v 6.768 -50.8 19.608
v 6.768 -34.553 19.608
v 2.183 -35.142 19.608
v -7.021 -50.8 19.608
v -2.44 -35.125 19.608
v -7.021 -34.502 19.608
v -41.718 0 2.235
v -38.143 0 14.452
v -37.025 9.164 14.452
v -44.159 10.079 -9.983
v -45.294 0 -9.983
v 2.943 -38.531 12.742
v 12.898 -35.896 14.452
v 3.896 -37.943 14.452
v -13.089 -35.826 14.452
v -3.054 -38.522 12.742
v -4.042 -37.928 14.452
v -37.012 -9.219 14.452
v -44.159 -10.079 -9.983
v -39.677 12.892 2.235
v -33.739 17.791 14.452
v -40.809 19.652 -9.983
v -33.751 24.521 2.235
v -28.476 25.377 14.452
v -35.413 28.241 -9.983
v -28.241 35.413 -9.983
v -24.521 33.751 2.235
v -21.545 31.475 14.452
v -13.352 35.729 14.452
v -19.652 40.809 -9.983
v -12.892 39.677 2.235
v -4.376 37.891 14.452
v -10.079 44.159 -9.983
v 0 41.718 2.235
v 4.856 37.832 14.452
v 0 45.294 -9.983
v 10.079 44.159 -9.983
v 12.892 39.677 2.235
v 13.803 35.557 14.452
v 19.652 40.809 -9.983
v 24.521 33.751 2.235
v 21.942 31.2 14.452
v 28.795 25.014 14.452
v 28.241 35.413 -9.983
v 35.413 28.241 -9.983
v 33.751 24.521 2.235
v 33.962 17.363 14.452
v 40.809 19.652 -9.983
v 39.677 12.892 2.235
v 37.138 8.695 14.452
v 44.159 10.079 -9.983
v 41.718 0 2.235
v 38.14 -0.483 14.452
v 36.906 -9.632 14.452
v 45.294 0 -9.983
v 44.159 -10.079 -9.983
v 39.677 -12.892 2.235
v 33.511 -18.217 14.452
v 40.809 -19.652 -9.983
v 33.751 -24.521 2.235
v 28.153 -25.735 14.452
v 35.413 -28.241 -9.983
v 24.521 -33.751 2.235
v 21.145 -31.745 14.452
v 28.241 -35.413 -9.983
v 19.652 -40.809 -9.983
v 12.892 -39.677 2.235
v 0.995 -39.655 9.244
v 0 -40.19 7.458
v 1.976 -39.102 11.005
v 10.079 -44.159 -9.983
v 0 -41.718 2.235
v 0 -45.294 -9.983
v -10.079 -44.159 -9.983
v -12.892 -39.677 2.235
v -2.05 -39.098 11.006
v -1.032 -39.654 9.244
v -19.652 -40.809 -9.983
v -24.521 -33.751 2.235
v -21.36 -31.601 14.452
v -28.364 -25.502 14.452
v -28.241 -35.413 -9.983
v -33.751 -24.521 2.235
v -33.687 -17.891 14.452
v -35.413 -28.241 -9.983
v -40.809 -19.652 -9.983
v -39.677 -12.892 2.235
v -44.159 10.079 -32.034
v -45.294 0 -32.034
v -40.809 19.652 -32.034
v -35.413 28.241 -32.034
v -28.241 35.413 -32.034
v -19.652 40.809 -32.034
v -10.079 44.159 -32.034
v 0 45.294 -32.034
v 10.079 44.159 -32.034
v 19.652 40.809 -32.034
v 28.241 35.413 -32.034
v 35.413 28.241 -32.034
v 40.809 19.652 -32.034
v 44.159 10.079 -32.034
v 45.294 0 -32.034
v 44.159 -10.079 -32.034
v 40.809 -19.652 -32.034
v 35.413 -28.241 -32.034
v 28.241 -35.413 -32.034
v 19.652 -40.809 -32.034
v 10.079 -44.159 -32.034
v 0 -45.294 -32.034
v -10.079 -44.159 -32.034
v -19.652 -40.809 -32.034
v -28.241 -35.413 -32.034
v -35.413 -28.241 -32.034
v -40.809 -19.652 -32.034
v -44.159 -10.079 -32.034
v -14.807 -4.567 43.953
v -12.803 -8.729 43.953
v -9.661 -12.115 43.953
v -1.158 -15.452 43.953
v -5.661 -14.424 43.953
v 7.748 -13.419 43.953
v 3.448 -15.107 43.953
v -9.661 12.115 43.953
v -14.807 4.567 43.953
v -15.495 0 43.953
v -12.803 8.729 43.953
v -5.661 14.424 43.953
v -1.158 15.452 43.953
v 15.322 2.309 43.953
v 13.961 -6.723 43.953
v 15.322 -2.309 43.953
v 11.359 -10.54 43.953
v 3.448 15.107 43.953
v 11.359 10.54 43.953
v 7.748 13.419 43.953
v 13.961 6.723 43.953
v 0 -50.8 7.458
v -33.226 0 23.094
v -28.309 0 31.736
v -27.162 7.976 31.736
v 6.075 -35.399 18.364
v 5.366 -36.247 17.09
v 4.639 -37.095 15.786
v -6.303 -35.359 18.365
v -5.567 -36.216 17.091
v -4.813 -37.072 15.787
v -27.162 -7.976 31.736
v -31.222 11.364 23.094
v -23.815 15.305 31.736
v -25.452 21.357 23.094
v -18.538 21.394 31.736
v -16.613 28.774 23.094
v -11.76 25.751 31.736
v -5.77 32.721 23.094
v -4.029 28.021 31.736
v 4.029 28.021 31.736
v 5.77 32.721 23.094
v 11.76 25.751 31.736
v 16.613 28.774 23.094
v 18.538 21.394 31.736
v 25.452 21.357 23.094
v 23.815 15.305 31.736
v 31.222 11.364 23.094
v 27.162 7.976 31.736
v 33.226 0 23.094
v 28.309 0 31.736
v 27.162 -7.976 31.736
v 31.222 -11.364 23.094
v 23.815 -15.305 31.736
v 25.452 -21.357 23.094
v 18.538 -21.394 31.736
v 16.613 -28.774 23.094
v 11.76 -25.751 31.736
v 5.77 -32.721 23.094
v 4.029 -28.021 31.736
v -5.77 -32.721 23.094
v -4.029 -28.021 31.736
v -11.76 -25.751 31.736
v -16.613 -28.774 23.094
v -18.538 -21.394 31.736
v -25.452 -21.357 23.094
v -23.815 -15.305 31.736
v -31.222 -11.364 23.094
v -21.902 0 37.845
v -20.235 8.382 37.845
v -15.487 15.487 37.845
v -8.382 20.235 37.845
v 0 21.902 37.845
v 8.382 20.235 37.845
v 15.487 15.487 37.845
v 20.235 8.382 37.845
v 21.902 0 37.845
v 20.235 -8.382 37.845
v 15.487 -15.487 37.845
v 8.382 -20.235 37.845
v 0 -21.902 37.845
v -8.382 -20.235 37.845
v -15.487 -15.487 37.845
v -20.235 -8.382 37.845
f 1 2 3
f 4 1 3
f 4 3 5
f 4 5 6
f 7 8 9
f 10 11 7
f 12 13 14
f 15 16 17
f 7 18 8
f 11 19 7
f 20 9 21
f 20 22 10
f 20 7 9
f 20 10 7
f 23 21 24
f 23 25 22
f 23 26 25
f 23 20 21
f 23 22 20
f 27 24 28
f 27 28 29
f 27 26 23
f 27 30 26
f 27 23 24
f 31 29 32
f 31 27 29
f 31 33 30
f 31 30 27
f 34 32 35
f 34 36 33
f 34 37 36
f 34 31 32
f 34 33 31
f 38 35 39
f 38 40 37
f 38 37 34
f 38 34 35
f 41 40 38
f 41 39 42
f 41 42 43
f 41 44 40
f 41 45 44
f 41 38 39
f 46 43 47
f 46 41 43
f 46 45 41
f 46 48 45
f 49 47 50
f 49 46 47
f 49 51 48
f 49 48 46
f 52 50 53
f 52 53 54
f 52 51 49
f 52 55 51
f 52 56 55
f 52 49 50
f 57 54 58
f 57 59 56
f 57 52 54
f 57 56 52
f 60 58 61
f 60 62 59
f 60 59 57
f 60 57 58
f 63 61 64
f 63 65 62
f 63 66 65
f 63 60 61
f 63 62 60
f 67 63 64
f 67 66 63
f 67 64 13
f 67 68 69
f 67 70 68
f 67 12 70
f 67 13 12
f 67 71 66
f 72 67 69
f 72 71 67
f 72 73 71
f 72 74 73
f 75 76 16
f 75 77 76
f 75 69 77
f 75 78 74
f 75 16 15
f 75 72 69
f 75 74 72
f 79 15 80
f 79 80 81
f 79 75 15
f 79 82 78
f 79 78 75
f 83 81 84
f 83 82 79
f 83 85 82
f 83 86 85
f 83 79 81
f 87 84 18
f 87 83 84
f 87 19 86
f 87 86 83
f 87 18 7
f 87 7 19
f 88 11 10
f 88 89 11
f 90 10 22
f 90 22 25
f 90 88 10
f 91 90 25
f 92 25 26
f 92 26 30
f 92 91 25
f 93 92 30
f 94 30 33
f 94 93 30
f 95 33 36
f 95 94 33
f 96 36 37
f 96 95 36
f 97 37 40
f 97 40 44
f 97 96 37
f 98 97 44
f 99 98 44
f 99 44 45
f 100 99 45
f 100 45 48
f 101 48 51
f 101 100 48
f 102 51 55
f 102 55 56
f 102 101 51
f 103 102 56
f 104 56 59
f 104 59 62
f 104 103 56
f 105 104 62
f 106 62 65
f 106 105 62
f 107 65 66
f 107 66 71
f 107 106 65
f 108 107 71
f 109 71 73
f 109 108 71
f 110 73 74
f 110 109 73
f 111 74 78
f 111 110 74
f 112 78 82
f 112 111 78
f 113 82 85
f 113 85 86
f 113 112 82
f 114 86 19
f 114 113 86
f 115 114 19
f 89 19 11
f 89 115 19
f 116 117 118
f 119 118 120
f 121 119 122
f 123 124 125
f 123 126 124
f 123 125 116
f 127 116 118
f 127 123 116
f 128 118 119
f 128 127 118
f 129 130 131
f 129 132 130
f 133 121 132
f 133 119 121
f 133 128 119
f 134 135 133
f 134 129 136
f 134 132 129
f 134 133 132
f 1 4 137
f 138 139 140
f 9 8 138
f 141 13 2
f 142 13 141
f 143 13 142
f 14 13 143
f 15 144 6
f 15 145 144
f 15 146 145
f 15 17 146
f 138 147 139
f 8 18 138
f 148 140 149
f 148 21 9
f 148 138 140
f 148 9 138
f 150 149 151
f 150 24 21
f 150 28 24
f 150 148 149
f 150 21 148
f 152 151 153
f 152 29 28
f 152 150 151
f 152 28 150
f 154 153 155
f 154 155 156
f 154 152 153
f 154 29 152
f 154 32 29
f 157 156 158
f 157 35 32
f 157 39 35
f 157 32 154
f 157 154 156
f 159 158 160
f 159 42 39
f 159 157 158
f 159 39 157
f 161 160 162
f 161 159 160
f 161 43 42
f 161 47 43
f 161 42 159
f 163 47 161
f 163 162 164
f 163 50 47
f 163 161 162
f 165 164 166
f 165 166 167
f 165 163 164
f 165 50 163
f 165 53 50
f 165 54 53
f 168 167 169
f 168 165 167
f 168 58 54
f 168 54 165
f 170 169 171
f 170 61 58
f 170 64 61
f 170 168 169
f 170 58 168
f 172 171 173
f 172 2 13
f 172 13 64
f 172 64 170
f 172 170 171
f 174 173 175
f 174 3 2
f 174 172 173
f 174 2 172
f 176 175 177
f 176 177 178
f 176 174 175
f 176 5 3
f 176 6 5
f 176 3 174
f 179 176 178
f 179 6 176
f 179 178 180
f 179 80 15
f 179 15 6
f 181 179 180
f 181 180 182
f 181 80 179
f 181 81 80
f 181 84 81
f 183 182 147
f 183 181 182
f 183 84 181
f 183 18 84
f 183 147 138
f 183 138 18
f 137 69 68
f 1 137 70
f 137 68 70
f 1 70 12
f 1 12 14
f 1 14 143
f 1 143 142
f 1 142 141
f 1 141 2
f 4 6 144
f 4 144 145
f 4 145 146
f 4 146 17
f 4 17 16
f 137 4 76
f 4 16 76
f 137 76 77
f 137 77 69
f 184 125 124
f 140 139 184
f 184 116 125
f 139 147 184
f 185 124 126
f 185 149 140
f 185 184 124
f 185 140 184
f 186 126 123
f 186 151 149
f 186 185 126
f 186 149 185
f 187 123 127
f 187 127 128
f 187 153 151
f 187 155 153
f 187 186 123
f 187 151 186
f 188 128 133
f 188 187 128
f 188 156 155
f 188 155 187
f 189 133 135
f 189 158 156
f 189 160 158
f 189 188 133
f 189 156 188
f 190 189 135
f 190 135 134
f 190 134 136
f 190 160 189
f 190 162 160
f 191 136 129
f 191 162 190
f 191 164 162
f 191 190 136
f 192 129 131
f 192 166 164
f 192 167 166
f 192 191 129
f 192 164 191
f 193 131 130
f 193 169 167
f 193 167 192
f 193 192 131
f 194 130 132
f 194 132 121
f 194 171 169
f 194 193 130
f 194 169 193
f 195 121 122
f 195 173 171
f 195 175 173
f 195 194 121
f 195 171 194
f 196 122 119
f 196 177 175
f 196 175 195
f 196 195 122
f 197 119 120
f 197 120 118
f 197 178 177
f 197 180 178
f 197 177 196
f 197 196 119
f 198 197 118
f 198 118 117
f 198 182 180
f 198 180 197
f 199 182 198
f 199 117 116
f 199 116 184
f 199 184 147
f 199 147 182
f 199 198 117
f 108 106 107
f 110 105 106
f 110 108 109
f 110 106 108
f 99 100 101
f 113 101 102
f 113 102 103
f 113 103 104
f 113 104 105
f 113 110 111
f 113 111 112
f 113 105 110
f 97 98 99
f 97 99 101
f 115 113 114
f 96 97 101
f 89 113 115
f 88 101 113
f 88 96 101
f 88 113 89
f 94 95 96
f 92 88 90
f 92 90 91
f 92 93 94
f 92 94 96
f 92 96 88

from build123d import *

# Parameters (mm, degrees)
F3_DEPTH = 50.8


with BuildPart() as f1:
    # F0 (on Front) → F1 (revolve)
    with BuildSketch(Plane.XZ):
        Polygon((-45.2943, -32.033801), (0, -32.033801), (0, 43.953352), (-15.49542, 43.953352), (-28.308939, 31.735811), (-38.142569, 14.452458), (-45.2943, -9.982626), align=None)
    revolve(axis=Axis((0, 0, 5.959775), (0, 0, -1)))

    # F2 (on Front) → F3 (join)
    with BuildSketch(Plane.XZ):
        Polygon((6.767772, 19.607749), (-7.021107, 19.607749), (0, 7.457786), align=None)
    extrude(amount=F3_DEPTH)


solid = f1.part
